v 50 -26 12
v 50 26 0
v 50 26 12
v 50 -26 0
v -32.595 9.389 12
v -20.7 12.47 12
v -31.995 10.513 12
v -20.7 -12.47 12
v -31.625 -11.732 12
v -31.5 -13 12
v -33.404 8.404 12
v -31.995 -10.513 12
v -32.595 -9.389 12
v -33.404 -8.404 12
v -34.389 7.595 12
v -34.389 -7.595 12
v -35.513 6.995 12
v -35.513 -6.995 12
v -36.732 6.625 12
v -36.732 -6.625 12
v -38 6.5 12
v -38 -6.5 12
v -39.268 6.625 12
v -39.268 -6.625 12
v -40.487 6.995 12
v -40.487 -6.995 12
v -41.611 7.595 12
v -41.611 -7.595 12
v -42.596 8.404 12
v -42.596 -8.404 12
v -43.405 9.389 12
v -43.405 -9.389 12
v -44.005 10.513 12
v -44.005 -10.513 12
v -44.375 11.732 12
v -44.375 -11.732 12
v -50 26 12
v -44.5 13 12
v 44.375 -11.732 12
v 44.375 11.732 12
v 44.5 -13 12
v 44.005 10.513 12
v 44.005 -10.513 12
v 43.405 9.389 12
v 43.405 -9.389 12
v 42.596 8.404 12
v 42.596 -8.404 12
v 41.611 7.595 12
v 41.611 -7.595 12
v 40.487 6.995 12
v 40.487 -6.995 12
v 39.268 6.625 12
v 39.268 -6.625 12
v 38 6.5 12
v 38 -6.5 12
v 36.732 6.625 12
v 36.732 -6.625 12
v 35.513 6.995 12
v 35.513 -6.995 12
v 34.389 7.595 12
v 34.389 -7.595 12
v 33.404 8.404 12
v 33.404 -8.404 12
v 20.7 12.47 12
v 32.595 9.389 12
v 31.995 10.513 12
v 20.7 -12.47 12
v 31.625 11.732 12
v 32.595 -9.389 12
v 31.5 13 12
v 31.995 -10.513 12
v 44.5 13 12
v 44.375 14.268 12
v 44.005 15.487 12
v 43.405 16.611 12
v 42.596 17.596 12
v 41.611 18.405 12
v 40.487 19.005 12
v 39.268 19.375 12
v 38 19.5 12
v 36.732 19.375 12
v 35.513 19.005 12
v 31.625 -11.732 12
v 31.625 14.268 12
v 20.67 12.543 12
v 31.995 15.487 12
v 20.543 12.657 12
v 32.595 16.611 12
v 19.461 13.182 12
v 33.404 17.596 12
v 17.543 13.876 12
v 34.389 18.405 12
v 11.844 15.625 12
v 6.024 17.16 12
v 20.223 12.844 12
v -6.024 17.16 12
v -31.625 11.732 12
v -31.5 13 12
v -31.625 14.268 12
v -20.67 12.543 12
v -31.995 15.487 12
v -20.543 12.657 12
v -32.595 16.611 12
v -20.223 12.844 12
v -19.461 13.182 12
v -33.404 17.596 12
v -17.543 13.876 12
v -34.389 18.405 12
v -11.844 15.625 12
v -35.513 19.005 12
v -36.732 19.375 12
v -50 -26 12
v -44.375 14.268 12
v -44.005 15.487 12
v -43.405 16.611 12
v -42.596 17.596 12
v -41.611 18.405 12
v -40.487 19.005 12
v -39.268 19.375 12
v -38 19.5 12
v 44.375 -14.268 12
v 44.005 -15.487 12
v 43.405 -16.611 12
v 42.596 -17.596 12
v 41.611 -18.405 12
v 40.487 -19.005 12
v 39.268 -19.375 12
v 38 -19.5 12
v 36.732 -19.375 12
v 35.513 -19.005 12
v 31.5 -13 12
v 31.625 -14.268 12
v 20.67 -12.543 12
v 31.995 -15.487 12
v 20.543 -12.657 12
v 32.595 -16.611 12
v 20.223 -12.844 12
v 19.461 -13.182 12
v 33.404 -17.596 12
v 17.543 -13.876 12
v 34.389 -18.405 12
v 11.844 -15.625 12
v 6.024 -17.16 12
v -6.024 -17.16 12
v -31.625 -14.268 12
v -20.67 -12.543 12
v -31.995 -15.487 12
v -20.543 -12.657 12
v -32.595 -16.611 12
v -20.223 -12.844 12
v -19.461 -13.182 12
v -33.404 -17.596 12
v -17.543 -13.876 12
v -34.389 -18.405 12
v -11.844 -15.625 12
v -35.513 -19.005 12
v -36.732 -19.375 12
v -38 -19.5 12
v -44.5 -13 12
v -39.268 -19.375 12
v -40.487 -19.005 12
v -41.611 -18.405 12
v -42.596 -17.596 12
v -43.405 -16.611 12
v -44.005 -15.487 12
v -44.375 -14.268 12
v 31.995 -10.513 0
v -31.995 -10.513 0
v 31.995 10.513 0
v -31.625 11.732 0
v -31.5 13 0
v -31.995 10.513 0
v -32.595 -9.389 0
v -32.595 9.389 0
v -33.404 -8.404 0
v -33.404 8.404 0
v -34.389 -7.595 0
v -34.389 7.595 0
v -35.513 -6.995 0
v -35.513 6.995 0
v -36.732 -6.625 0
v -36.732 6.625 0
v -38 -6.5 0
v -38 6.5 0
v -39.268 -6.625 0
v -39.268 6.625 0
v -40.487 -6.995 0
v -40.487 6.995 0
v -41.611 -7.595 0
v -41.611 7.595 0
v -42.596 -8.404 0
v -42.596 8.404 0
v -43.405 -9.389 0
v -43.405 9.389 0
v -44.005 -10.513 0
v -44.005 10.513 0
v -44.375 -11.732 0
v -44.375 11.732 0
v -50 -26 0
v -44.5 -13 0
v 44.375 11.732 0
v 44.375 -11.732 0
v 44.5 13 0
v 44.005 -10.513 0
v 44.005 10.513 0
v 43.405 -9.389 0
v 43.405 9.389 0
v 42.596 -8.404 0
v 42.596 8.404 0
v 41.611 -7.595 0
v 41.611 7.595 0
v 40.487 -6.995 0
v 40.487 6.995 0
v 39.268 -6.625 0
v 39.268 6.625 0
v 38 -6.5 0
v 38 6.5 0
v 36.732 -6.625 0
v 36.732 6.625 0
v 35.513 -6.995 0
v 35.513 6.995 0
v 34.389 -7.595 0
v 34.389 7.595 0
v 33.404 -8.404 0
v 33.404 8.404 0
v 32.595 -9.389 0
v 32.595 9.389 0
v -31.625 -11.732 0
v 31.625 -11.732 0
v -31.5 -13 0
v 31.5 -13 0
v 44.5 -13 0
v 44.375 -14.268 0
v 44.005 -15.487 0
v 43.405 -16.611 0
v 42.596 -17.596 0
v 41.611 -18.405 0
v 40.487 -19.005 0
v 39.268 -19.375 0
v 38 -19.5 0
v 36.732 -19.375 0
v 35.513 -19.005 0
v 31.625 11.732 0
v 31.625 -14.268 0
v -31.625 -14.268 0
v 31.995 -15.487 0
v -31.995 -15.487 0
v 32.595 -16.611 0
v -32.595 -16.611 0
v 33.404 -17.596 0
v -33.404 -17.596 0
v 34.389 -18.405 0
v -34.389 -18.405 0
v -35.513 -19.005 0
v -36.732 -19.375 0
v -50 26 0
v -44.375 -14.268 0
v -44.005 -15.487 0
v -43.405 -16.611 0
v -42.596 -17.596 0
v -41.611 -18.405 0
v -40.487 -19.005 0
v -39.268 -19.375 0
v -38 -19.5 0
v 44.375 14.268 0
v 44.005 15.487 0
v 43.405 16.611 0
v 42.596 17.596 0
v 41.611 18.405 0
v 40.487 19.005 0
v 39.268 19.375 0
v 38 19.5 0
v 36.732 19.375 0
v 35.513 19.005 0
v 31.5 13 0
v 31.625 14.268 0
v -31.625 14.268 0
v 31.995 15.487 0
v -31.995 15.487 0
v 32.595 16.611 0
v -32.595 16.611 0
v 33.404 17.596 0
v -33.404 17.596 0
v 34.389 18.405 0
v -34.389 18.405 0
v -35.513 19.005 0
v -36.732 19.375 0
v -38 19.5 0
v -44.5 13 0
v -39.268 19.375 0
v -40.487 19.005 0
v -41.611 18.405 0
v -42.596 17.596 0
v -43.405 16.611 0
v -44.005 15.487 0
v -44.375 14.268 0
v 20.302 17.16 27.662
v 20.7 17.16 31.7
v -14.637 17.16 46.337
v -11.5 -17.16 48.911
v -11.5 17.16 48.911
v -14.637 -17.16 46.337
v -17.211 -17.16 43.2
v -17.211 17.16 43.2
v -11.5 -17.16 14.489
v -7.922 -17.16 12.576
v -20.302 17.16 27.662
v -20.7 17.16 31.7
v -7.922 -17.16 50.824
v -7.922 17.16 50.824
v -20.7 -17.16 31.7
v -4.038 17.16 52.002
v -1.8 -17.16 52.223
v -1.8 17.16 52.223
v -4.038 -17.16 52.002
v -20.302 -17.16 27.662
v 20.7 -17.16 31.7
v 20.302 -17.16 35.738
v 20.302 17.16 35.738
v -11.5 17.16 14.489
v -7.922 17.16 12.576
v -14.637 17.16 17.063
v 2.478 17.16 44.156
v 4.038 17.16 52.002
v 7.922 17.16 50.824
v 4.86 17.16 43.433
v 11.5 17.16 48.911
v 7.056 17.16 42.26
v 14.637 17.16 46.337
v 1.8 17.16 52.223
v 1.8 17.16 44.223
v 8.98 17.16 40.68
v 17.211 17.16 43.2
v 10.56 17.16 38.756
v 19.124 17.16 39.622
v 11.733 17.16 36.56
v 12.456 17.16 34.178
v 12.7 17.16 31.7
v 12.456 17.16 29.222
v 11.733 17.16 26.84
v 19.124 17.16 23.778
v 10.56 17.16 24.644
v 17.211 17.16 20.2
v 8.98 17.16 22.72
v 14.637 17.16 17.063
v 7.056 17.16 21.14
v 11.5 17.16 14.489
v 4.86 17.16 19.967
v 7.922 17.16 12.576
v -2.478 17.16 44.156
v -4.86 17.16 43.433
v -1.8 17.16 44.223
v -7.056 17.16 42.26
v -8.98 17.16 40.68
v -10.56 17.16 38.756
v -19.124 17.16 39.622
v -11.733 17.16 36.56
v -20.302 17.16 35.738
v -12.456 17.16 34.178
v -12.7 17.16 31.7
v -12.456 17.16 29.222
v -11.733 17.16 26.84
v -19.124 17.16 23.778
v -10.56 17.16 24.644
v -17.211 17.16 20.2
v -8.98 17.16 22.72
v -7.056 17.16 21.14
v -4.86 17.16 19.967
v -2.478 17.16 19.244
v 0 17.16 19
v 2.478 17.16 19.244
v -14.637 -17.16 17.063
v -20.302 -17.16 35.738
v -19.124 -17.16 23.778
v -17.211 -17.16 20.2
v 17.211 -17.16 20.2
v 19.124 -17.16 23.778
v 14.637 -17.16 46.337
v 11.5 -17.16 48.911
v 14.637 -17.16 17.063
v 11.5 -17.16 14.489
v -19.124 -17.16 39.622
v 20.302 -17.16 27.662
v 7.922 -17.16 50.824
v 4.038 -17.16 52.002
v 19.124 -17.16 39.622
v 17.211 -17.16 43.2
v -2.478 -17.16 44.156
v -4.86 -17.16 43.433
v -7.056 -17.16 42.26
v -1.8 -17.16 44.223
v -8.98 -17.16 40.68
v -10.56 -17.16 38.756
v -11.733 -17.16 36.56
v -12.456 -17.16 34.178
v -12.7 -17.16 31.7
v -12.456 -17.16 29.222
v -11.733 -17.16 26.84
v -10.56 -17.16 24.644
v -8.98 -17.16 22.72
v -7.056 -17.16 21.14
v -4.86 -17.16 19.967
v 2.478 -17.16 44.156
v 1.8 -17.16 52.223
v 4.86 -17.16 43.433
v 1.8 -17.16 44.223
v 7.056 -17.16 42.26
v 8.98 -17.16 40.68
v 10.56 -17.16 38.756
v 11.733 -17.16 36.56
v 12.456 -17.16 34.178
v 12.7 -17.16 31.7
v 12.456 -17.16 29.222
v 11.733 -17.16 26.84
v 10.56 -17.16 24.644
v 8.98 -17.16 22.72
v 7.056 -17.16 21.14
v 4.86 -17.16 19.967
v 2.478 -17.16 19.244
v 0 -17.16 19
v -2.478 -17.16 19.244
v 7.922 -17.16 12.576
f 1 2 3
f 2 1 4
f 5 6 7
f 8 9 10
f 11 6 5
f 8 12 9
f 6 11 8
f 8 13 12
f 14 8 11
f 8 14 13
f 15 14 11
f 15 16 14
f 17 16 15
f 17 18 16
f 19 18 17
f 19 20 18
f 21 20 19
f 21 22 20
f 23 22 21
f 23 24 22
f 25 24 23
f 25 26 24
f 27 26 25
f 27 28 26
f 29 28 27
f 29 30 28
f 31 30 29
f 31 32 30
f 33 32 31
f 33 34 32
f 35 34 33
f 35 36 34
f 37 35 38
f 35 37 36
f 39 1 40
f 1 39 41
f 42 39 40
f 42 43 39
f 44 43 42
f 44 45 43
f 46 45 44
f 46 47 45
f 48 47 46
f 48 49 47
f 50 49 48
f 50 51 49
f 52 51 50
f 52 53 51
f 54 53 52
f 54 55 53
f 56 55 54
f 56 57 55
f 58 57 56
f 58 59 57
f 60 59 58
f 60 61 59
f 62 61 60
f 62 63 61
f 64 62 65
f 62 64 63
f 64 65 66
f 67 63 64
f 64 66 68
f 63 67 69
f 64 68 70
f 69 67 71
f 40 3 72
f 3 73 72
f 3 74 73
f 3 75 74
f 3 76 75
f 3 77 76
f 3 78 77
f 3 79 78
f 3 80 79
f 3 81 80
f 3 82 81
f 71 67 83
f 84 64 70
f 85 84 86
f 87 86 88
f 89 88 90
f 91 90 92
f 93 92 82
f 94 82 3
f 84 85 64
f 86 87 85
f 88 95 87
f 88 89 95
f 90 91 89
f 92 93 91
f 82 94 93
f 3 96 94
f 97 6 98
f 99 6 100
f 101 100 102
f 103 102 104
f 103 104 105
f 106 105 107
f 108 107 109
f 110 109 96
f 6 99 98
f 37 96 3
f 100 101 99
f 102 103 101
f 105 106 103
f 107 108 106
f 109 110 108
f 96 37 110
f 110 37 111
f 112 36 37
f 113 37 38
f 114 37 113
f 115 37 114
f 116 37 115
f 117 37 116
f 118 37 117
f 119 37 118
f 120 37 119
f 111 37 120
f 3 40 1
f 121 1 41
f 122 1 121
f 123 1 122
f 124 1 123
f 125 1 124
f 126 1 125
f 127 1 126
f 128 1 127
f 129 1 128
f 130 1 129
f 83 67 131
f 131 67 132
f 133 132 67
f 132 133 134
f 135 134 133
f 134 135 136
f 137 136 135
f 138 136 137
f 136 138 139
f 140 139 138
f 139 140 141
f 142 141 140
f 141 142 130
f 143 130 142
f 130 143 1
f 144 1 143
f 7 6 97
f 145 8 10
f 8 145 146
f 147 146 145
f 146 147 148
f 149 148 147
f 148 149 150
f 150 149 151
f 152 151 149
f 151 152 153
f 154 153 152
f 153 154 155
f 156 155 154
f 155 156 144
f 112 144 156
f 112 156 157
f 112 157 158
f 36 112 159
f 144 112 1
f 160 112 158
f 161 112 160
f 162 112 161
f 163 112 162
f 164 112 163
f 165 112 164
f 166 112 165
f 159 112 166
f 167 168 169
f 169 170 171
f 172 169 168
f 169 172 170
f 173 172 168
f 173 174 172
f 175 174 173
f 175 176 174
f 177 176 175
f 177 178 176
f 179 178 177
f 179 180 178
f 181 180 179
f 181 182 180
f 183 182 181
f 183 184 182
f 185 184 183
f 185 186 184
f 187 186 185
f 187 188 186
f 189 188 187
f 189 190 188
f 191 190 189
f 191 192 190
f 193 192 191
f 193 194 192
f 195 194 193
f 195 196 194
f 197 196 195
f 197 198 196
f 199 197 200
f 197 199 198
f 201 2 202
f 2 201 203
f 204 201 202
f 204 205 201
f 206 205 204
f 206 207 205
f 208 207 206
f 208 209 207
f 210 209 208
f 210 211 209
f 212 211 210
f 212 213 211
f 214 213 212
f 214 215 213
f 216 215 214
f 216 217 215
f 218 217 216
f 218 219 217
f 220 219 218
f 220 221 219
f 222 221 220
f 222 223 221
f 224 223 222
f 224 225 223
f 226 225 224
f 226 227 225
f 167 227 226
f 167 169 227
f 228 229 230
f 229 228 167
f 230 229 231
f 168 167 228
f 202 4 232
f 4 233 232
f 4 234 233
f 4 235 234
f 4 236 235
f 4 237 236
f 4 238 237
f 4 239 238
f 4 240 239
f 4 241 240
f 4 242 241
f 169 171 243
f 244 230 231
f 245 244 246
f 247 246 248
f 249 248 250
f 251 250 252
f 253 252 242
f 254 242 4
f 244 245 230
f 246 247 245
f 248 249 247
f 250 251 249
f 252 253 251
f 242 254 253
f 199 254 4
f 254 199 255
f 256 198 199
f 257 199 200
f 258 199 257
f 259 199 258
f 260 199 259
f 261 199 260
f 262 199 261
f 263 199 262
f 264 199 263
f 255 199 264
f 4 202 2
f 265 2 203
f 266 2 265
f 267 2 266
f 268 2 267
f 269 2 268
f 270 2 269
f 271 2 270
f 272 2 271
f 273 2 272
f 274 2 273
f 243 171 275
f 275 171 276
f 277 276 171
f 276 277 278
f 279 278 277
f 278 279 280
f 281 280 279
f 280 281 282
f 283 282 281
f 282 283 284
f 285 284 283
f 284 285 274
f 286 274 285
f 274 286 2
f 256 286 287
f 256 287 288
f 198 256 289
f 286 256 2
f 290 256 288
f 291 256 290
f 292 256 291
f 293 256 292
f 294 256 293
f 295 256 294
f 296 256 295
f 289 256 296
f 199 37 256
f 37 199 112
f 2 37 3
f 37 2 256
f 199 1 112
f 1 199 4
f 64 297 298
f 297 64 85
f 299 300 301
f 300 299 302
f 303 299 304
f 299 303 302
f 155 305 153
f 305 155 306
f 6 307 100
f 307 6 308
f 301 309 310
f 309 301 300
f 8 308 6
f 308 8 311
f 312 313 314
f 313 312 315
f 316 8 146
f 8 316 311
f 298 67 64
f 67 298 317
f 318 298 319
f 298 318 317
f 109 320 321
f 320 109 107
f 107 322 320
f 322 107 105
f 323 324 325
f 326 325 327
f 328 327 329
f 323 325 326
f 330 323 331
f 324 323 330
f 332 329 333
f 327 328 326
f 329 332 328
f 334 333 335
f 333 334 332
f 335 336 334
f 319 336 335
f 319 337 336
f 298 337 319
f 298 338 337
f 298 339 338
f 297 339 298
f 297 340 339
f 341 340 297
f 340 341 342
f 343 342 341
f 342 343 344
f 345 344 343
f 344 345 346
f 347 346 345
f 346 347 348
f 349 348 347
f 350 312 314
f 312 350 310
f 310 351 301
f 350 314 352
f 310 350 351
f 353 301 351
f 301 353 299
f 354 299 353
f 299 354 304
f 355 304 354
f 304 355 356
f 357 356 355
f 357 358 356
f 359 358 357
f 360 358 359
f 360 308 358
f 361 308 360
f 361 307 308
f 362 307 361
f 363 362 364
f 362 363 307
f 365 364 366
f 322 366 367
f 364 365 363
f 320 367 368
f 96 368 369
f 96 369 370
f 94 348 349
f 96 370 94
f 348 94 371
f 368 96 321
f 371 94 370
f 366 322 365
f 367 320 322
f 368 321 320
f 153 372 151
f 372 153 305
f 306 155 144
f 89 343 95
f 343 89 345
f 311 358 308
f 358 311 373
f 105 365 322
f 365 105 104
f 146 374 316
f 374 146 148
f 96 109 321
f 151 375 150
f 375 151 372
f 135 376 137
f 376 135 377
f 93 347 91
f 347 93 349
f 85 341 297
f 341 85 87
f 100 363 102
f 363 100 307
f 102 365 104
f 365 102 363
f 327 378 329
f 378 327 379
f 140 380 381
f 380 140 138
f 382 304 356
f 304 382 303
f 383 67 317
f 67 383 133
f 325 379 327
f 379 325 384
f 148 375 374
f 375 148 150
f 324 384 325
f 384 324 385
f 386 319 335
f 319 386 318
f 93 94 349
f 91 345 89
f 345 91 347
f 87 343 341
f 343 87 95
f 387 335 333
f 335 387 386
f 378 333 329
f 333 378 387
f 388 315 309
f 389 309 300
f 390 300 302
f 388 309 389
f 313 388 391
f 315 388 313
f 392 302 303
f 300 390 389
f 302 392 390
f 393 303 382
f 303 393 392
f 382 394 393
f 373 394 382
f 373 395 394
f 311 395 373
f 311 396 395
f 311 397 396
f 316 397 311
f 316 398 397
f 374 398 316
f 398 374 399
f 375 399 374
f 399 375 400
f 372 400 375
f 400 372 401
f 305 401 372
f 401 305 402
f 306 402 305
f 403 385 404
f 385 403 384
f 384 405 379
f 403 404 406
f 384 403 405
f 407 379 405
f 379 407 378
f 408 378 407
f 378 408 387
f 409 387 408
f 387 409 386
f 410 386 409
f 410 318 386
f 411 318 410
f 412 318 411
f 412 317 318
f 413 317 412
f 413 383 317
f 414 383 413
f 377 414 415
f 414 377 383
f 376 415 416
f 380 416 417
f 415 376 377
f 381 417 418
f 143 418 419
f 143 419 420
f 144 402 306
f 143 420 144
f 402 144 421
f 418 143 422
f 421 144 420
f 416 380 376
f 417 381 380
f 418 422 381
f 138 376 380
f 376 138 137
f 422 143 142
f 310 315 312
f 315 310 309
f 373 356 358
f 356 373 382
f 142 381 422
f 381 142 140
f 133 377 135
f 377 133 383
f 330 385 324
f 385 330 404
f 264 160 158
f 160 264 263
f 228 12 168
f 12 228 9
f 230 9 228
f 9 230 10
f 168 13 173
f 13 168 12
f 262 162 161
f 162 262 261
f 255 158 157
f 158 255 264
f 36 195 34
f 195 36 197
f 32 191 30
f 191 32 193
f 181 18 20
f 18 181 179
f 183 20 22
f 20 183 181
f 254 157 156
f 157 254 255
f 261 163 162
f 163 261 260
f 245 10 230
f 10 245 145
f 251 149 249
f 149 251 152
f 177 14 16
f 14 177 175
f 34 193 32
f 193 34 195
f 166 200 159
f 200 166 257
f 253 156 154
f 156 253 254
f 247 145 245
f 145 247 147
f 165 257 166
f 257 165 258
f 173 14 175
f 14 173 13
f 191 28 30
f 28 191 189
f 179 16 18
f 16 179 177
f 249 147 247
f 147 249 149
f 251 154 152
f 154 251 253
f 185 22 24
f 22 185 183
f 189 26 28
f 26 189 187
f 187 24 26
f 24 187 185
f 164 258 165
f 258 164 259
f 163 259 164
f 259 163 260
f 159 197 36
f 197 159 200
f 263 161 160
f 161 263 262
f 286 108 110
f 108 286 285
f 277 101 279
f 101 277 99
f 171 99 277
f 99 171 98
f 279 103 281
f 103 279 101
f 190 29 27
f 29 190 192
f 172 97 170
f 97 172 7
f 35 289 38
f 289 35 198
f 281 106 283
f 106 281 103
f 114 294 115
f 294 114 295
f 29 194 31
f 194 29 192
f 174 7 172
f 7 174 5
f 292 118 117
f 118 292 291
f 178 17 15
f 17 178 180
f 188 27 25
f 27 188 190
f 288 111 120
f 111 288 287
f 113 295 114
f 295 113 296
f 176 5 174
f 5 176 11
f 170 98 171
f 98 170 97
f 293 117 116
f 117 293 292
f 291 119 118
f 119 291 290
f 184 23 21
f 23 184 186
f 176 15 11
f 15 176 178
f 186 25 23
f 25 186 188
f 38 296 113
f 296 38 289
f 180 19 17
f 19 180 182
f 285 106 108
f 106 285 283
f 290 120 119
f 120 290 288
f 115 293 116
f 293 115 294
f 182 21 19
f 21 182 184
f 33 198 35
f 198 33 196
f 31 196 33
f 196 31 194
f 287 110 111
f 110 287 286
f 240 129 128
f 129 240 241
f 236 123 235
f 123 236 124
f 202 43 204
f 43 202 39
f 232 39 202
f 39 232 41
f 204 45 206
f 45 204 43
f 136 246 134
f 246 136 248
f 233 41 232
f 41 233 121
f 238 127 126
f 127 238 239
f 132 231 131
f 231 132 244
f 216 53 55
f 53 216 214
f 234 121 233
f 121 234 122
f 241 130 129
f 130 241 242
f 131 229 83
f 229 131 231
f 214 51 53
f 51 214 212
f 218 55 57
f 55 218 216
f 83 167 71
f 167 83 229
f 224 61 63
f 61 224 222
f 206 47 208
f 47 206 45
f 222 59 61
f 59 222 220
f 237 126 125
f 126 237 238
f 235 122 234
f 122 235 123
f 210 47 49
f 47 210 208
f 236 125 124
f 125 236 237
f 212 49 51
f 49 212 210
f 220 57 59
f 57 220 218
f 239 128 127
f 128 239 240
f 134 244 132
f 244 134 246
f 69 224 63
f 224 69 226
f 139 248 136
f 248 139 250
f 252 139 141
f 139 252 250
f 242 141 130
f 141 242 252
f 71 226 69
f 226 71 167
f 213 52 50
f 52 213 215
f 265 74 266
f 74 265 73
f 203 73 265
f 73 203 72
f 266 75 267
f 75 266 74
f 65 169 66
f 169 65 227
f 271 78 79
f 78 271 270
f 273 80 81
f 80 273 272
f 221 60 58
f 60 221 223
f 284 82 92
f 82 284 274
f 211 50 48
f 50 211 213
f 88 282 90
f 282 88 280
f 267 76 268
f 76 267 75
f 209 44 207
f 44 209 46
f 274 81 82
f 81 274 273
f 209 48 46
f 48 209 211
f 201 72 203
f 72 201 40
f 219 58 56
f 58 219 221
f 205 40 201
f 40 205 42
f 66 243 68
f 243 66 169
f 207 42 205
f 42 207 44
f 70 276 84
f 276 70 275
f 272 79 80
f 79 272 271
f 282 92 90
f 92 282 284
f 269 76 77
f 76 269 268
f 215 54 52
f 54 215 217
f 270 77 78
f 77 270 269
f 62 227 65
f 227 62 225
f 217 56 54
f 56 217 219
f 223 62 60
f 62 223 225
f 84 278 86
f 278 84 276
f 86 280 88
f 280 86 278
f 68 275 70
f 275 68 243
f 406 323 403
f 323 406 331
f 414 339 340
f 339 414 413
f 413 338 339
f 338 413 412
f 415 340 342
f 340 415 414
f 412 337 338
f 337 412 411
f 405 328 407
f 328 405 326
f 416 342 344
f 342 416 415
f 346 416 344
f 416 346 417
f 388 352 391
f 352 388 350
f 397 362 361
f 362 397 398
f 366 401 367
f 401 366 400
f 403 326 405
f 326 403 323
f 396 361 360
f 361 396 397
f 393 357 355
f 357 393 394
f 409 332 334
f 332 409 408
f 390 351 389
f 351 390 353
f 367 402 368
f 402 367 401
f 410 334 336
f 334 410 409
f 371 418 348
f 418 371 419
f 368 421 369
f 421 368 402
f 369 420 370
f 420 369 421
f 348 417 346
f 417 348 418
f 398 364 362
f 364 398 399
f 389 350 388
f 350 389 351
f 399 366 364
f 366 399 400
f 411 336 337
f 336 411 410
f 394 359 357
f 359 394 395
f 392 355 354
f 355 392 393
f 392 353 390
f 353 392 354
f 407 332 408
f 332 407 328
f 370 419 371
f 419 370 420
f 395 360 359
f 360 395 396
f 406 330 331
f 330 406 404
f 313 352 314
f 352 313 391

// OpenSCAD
$fn = 32;

// ----------------------------------------------------------------------
// Bearing block: 100 x 52 mm base, 25.4 mm bore at 31.7 mm
// ----------------------------------------------------------------------

// --- parameters (mm) ---
base_w = 100;             // base width
base_d = 52;              // base depth
base_t = 12;              // base thickness
bore_d = 25.4;            // shaft / bearing bore
house_r = 20.7;           // housing outer radius
house_len = 34.32;        // housing length along the shaft
foot_w = 41.4;            // foot width under the housing
foot_len = 24.32;         // foot length along the shaft
axis_z = 31.7;            // bore axis height above the base
holes_d = 13;             // mounting holes
hole_x = 38;              // mounting hole spacing
groove_w = 3.6;           // oil groove width

difference() {
  union() {
    /* base plate with its underside on z = 0 */
    translate([0, 0, base_t / 2]) cube([base_w, base_d, base_t], center = true);
    /* hull foot: a straight web blending into the round housing */
    hull() {
      translate([0, 0, base_t - 0.5]) cube([foot_w, foot_len, 1.6], center = true);
      translate([0, 0, axis_z]) rotate([-90, 0, 0]) cylinder(h = house_len, d = 2 * house_r, center = true);
    }
  }
  /* bore through the housing, 2.5 mm clear on both sides */
  translate([0, 0, axis_z]) rotate([-90, 0, 0]) cylinder(h = house_len + 5, d = bore_d, center = true);
  /* oil groove from the top of the housing into the bore */
  translate([-groove_w / 2, -house_len / 2 - 2.5, axis_z + bore_d * 0.17]) cube([groove_w, house_len + 5, house_r + 5]);
  /* mounting holes through the base plate */
  for (hx = [-38, 38]) {
    for (hy = [-13, 13]) {
      translate([hx, hy, -2.5]) cylinder(h = base_t + 5, d = holes_d);
    }
  }
}
